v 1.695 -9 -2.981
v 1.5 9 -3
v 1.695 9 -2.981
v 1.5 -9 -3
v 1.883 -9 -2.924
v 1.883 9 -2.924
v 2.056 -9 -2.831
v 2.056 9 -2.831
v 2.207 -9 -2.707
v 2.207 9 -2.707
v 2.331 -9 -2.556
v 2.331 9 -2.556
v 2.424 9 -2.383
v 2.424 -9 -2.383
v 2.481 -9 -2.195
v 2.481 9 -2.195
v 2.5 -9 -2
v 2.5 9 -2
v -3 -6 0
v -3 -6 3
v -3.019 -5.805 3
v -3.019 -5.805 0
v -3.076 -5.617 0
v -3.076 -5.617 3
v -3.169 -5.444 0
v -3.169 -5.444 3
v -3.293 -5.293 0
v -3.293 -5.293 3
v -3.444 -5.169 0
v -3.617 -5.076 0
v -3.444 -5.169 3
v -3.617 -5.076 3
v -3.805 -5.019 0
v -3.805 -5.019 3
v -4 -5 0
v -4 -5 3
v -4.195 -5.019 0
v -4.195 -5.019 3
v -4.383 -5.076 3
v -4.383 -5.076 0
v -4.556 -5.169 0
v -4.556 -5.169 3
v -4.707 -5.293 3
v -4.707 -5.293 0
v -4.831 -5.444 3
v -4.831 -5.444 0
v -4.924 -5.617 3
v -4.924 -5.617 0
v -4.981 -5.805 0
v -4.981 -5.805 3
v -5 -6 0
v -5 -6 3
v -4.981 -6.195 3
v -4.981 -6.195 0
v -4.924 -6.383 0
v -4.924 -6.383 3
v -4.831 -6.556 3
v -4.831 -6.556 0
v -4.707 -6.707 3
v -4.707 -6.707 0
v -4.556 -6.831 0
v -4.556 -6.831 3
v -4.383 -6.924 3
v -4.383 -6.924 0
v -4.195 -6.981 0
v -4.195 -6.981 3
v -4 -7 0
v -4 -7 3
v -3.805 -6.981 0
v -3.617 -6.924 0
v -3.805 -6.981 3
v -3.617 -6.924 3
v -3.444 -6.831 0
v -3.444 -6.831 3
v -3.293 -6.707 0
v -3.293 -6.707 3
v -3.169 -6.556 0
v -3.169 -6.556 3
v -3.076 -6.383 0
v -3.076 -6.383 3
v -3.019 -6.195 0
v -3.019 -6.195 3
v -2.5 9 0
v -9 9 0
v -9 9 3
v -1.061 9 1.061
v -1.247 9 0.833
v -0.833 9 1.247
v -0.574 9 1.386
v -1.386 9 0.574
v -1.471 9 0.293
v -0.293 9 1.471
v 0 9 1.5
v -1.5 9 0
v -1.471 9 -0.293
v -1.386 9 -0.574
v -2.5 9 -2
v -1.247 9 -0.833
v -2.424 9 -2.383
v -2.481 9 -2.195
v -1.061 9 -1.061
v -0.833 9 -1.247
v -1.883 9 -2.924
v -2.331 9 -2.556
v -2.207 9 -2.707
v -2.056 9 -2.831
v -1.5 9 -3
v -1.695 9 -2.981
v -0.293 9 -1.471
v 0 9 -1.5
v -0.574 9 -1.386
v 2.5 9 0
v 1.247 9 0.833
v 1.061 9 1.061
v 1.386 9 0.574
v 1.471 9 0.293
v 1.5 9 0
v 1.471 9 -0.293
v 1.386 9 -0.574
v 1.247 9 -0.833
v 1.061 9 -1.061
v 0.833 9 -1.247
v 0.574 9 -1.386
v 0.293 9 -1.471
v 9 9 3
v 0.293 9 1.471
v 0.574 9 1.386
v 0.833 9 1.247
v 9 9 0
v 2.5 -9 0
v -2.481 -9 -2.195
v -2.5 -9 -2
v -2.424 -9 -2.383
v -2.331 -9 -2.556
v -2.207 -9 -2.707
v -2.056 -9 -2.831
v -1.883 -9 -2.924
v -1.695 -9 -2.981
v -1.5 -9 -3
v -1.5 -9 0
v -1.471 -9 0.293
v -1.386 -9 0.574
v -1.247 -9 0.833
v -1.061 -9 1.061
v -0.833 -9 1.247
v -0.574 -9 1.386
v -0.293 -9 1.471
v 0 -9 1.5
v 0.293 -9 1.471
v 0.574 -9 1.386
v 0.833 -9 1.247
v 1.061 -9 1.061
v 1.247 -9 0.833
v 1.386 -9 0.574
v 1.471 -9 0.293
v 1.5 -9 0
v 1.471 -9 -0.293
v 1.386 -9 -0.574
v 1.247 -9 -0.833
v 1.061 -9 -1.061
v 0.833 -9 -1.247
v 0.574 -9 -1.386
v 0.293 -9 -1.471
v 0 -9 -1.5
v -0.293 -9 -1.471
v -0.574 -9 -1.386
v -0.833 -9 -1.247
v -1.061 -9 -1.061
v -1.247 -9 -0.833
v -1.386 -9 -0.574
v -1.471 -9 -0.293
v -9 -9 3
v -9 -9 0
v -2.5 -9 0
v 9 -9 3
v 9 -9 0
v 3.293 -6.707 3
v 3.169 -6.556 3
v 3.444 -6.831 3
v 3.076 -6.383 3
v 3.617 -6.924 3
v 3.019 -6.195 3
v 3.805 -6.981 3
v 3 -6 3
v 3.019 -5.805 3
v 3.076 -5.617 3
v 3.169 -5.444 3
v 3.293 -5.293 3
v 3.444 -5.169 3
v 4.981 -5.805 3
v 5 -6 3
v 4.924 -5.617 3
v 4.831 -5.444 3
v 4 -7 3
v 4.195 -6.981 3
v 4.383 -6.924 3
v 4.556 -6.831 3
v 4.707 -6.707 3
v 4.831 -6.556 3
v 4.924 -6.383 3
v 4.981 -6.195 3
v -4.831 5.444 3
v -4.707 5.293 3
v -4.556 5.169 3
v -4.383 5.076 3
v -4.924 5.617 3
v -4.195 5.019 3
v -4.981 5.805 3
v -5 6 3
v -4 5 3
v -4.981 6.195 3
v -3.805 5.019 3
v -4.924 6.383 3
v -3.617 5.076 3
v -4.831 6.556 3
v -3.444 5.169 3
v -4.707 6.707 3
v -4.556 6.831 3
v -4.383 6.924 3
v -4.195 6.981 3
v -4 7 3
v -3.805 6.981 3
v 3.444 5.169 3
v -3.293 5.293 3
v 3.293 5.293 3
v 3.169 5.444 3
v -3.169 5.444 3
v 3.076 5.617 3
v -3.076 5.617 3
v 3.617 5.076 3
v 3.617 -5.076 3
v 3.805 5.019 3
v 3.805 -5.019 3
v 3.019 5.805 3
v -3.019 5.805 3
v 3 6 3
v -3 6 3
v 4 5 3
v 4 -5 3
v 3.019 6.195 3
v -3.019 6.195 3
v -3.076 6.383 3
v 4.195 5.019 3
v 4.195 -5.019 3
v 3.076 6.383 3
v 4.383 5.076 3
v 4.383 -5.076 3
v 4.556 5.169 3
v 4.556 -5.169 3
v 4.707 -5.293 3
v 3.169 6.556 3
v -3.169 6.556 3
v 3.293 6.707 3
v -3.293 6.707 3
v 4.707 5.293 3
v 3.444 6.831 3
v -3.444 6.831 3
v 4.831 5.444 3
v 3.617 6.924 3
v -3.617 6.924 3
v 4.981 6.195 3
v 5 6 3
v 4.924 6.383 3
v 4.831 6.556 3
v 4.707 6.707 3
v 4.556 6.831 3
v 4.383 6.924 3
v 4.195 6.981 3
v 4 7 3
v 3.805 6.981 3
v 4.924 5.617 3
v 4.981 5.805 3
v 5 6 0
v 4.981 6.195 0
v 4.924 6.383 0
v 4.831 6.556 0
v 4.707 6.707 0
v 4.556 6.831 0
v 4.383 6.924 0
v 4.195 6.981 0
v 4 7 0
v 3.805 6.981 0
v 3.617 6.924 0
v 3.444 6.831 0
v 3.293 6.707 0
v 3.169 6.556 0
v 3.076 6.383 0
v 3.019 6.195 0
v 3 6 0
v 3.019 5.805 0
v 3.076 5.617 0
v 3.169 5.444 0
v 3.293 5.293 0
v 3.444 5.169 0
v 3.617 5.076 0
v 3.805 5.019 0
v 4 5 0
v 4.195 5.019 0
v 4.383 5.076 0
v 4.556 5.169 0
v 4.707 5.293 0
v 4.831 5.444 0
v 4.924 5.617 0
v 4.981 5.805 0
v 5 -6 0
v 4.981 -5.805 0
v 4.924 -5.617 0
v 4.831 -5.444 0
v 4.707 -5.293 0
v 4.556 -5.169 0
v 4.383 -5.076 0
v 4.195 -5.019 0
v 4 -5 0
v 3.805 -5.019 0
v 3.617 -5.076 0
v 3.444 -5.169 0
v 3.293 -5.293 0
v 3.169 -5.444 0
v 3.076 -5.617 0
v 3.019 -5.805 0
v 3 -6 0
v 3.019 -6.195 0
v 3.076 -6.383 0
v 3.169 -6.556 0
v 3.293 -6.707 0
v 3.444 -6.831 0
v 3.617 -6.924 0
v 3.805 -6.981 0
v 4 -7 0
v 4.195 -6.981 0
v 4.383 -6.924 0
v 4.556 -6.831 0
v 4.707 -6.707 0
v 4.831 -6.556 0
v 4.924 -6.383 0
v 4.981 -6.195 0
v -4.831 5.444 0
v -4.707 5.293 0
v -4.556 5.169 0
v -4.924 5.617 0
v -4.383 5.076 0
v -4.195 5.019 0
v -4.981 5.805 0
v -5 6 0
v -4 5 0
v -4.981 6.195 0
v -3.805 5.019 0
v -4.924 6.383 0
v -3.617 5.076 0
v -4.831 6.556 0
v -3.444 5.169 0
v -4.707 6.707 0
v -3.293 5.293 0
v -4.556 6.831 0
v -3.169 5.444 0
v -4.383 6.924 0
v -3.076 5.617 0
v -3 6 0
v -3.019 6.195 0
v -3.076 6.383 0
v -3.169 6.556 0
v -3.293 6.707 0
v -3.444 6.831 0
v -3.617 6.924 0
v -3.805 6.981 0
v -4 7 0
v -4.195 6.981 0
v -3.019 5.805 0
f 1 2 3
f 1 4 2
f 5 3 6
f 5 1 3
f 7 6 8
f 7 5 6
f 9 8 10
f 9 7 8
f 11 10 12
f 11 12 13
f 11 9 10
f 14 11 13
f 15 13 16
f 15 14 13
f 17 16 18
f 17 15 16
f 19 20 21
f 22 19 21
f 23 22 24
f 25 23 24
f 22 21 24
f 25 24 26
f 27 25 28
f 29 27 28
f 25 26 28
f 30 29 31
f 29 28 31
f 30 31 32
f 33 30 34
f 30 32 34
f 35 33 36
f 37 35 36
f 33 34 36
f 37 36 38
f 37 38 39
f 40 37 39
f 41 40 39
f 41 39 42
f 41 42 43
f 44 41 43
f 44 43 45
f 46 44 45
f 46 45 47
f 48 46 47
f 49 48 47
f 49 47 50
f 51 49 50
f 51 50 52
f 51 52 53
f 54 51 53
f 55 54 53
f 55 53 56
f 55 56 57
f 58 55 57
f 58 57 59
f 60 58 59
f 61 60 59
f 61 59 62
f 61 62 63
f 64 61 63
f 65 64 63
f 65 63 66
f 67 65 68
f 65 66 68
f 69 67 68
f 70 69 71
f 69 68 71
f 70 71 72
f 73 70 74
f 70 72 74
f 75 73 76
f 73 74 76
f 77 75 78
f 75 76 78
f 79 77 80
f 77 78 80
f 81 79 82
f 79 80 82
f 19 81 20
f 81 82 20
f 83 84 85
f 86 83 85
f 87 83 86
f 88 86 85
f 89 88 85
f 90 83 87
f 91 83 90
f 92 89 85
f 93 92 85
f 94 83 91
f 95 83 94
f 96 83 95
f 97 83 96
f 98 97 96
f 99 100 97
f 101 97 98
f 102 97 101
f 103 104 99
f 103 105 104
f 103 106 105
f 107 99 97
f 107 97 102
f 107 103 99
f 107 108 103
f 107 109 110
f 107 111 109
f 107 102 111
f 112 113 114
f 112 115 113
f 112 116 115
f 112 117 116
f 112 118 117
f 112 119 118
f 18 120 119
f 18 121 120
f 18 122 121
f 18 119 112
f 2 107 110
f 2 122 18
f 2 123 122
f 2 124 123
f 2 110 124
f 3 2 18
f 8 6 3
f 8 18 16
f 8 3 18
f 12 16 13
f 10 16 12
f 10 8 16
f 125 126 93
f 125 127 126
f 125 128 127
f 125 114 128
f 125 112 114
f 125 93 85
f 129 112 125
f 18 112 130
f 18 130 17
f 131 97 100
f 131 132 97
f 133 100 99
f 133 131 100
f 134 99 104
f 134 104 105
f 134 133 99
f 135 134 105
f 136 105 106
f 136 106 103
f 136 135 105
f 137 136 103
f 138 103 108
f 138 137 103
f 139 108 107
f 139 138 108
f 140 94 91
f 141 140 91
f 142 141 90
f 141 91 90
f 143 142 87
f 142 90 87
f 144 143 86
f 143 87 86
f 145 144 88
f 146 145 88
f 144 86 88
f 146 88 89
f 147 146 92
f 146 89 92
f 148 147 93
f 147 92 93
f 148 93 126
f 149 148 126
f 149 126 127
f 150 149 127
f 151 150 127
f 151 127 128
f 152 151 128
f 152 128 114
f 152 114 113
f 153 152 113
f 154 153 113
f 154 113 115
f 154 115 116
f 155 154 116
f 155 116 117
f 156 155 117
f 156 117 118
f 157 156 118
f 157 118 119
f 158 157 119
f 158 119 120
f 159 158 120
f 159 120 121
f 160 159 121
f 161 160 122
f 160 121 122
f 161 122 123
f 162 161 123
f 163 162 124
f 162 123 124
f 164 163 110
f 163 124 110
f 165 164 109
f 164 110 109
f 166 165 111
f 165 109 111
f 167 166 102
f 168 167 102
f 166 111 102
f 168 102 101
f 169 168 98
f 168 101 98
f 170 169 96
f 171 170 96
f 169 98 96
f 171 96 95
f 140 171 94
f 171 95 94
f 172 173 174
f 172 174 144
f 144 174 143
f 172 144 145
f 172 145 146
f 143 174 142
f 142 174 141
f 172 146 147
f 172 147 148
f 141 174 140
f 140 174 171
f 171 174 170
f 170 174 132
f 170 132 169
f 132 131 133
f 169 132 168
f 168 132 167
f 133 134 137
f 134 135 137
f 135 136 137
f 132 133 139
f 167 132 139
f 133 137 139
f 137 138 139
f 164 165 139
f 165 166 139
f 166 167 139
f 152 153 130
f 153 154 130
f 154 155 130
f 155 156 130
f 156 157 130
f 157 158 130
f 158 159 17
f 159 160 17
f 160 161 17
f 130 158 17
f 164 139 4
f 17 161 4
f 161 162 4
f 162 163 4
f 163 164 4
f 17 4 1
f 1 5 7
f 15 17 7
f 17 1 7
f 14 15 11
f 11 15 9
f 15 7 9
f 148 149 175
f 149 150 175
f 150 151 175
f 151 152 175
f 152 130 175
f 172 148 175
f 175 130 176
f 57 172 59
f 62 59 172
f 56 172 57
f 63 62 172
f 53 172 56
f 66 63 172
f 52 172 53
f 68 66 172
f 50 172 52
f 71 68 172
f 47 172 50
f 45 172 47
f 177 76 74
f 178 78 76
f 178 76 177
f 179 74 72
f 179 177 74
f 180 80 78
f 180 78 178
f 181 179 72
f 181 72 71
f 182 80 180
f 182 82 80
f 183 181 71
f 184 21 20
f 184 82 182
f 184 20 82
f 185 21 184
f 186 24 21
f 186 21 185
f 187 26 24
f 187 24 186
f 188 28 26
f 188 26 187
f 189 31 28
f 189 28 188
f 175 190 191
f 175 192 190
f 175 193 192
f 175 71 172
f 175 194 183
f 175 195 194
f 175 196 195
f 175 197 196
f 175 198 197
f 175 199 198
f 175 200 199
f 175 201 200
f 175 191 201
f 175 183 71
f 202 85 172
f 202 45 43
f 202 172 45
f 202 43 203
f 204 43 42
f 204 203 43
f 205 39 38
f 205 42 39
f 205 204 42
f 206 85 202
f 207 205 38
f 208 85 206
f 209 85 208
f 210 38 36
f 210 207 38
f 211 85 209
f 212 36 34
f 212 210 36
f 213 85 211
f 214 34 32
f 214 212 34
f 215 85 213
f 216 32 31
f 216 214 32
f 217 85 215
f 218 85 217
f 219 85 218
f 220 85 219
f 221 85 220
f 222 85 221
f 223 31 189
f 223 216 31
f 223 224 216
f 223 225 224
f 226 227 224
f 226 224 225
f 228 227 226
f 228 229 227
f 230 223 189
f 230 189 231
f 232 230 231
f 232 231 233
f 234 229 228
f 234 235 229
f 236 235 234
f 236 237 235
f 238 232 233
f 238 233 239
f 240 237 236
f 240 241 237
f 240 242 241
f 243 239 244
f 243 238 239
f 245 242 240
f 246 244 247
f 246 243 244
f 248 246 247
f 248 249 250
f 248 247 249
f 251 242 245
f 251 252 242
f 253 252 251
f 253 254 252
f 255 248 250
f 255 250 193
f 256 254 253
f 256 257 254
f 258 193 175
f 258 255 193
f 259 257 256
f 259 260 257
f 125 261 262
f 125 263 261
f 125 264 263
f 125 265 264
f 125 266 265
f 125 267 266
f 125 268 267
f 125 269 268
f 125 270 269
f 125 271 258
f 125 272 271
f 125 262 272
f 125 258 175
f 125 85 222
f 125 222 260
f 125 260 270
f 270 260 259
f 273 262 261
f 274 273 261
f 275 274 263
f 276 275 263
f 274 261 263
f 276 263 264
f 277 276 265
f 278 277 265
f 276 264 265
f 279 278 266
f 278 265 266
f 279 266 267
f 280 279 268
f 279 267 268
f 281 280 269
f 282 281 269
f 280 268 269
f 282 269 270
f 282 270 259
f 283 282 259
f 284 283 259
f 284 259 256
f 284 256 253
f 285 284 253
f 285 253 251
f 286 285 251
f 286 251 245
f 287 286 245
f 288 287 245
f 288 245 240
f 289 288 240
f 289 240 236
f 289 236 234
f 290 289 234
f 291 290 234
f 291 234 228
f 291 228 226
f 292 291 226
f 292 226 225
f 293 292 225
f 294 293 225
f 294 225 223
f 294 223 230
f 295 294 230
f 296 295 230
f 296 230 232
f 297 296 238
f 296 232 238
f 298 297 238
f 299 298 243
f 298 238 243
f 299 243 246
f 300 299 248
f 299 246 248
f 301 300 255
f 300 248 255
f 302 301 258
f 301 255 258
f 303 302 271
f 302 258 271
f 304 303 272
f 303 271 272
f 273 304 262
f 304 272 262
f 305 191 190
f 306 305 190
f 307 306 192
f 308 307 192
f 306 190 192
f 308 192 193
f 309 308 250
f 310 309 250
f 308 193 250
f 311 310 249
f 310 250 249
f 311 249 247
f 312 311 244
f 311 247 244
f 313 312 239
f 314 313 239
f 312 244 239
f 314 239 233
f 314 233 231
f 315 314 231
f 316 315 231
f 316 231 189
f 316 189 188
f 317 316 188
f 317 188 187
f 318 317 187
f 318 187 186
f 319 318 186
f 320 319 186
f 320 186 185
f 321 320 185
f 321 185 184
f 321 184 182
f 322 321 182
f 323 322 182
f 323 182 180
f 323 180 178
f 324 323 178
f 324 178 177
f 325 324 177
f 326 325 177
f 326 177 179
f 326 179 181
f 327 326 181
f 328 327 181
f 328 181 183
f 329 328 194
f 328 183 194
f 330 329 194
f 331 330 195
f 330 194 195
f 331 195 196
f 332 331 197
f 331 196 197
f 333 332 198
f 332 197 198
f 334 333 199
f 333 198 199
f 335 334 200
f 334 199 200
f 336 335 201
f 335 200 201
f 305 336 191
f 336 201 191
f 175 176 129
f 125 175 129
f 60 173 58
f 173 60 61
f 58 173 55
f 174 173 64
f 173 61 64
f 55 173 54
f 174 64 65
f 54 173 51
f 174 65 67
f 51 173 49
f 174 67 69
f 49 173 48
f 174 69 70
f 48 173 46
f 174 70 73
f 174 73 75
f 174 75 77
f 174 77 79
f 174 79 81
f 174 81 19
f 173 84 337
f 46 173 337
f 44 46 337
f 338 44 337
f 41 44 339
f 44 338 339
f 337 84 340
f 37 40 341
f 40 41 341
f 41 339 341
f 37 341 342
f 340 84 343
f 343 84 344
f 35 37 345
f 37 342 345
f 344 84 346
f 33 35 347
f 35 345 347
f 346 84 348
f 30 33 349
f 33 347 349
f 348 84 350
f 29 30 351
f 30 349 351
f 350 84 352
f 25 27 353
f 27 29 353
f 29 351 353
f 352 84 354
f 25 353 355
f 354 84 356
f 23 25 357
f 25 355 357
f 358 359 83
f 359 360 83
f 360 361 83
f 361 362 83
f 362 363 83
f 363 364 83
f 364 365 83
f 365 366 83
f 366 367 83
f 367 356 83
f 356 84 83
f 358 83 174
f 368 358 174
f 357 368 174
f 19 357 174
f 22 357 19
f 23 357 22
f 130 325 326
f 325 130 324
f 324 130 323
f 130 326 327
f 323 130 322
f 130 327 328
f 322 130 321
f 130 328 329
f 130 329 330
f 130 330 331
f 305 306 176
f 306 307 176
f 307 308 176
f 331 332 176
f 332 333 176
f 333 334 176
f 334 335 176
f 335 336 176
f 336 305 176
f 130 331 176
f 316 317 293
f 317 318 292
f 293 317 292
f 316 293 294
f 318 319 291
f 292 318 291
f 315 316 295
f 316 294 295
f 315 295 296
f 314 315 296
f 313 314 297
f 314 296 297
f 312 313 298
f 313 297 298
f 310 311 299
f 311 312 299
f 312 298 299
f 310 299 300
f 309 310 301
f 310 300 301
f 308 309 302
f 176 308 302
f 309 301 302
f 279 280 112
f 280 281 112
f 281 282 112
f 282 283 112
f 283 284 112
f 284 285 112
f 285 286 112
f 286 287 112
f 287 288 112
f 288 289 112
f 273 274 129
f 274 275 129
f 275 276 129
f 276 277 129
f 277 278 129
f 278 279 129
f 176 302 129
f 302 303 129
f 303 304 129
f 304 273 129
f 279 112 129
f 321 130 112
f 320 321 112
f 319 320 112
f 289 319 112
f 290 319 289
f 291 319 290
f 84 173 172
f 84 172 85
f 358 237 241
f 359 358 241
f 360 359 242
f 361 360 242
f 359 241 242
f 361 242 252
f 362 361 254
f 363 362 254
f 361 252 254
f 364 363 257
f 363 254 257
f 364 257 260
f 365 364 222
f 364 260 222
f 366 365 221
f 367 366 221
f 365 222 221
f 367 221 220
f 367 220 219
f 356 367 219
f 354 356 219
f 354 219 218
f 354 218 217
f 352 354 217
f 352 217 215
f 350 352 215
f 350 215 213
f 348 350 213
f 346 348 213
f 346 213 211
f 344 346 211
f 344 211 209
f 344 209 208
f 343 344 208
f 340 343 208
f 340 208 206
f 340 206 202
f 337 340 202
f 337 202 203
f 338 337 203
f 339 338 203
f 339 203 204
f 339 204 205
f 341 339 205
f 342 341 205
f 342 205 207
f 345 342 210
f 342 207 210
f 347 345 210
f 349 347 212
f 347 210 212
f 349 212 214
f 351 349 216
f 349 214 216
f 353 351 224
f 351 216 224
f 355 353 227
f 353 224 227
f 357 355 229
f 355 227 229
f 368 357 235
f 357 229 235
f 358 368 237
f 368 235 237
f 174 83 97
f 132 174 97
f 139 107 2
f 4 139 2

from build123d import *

# Parameters (mm, degrees)
SKETCH_1_W          = 18
SKETCH_1_H          = 18
EXTRUDE_1_DEPTH     = 3
SKETCH_4_R          = 1
CUT_EXTRUDE_1_DEPTH = 14.076696831
SKETCH_8_W          = 5
SKETCH_8_H          = 3
EXTRUDE_4_DEPTH     = 18
SKETCH_9_R          = 1.5
CUT_EXTRUDE_3_DEPTH = 21.346989949
FILLET_3_R          = 1


with BuildPart() as part:
    # 草图1 → 凸台-拉伸1 (new body)
    with BuildSketch(Plane.XY):
        Rectangle(SKETCH_1_W, SKETCH_1_H)
    extrude(amount=EXTRUDE_1_DEPTH)

    # 草图4 → 切除-拉伸1 (cut, through all)
    with BuildSketch(Plane.XY.offset(3)):
        with Locations((-4, -6)):
            Circle(SKETCH_4_R)
        with Locations((4, -6)):
            Circle(SKETCH_4_R)
        with Locations((4, 6)):
            Circle(SKETCH_4_R)
        with Locations((-4, 6)):
            Circle(SKETCH_4_R)
    extrude(amount=-CUT_EXTRUDE_1_DEPTH, mode=Mode.SUBTRACT)

    # 草图8 → 凸台-拉伸4 (add)
    with BuildSketch(Plane(origin=(0, 9, 0), x_dir=(1, 0, 0), z_dir=(0, 1, 0))):
        with Locations((0, 1.5)):
            Rectangle(SKETCH_8_W, SKETCH_8_H)
    extrude(amount=-EXTRUDE_4_DEPTH)

    # 草图9 → 切除-拉伸3 (cut, through all)
    with BuildSketch(Plane(origin=(0, 9, 0), x_dir=(1, 0, 0), z_dir=(0, 1, 0))):
        with Locations(Location((0, 0, 0), (0, 0, 180))):
            Circle(SKETCH_9_R)
    extrude(amount=-CUT_EXTRUDE_3_DEPTH, mode=Mode.SUBTRACT)

    # 圆角3
    fillet_3_edges = [part.edges().sort_by_distance(p)[0] for p in [
        (-2.5, 0, -3),
        (2.5, 0, -3),
    ]]
    fillet(fillet_3_edges, radius=FILLET_3_R)


solid = part.part
